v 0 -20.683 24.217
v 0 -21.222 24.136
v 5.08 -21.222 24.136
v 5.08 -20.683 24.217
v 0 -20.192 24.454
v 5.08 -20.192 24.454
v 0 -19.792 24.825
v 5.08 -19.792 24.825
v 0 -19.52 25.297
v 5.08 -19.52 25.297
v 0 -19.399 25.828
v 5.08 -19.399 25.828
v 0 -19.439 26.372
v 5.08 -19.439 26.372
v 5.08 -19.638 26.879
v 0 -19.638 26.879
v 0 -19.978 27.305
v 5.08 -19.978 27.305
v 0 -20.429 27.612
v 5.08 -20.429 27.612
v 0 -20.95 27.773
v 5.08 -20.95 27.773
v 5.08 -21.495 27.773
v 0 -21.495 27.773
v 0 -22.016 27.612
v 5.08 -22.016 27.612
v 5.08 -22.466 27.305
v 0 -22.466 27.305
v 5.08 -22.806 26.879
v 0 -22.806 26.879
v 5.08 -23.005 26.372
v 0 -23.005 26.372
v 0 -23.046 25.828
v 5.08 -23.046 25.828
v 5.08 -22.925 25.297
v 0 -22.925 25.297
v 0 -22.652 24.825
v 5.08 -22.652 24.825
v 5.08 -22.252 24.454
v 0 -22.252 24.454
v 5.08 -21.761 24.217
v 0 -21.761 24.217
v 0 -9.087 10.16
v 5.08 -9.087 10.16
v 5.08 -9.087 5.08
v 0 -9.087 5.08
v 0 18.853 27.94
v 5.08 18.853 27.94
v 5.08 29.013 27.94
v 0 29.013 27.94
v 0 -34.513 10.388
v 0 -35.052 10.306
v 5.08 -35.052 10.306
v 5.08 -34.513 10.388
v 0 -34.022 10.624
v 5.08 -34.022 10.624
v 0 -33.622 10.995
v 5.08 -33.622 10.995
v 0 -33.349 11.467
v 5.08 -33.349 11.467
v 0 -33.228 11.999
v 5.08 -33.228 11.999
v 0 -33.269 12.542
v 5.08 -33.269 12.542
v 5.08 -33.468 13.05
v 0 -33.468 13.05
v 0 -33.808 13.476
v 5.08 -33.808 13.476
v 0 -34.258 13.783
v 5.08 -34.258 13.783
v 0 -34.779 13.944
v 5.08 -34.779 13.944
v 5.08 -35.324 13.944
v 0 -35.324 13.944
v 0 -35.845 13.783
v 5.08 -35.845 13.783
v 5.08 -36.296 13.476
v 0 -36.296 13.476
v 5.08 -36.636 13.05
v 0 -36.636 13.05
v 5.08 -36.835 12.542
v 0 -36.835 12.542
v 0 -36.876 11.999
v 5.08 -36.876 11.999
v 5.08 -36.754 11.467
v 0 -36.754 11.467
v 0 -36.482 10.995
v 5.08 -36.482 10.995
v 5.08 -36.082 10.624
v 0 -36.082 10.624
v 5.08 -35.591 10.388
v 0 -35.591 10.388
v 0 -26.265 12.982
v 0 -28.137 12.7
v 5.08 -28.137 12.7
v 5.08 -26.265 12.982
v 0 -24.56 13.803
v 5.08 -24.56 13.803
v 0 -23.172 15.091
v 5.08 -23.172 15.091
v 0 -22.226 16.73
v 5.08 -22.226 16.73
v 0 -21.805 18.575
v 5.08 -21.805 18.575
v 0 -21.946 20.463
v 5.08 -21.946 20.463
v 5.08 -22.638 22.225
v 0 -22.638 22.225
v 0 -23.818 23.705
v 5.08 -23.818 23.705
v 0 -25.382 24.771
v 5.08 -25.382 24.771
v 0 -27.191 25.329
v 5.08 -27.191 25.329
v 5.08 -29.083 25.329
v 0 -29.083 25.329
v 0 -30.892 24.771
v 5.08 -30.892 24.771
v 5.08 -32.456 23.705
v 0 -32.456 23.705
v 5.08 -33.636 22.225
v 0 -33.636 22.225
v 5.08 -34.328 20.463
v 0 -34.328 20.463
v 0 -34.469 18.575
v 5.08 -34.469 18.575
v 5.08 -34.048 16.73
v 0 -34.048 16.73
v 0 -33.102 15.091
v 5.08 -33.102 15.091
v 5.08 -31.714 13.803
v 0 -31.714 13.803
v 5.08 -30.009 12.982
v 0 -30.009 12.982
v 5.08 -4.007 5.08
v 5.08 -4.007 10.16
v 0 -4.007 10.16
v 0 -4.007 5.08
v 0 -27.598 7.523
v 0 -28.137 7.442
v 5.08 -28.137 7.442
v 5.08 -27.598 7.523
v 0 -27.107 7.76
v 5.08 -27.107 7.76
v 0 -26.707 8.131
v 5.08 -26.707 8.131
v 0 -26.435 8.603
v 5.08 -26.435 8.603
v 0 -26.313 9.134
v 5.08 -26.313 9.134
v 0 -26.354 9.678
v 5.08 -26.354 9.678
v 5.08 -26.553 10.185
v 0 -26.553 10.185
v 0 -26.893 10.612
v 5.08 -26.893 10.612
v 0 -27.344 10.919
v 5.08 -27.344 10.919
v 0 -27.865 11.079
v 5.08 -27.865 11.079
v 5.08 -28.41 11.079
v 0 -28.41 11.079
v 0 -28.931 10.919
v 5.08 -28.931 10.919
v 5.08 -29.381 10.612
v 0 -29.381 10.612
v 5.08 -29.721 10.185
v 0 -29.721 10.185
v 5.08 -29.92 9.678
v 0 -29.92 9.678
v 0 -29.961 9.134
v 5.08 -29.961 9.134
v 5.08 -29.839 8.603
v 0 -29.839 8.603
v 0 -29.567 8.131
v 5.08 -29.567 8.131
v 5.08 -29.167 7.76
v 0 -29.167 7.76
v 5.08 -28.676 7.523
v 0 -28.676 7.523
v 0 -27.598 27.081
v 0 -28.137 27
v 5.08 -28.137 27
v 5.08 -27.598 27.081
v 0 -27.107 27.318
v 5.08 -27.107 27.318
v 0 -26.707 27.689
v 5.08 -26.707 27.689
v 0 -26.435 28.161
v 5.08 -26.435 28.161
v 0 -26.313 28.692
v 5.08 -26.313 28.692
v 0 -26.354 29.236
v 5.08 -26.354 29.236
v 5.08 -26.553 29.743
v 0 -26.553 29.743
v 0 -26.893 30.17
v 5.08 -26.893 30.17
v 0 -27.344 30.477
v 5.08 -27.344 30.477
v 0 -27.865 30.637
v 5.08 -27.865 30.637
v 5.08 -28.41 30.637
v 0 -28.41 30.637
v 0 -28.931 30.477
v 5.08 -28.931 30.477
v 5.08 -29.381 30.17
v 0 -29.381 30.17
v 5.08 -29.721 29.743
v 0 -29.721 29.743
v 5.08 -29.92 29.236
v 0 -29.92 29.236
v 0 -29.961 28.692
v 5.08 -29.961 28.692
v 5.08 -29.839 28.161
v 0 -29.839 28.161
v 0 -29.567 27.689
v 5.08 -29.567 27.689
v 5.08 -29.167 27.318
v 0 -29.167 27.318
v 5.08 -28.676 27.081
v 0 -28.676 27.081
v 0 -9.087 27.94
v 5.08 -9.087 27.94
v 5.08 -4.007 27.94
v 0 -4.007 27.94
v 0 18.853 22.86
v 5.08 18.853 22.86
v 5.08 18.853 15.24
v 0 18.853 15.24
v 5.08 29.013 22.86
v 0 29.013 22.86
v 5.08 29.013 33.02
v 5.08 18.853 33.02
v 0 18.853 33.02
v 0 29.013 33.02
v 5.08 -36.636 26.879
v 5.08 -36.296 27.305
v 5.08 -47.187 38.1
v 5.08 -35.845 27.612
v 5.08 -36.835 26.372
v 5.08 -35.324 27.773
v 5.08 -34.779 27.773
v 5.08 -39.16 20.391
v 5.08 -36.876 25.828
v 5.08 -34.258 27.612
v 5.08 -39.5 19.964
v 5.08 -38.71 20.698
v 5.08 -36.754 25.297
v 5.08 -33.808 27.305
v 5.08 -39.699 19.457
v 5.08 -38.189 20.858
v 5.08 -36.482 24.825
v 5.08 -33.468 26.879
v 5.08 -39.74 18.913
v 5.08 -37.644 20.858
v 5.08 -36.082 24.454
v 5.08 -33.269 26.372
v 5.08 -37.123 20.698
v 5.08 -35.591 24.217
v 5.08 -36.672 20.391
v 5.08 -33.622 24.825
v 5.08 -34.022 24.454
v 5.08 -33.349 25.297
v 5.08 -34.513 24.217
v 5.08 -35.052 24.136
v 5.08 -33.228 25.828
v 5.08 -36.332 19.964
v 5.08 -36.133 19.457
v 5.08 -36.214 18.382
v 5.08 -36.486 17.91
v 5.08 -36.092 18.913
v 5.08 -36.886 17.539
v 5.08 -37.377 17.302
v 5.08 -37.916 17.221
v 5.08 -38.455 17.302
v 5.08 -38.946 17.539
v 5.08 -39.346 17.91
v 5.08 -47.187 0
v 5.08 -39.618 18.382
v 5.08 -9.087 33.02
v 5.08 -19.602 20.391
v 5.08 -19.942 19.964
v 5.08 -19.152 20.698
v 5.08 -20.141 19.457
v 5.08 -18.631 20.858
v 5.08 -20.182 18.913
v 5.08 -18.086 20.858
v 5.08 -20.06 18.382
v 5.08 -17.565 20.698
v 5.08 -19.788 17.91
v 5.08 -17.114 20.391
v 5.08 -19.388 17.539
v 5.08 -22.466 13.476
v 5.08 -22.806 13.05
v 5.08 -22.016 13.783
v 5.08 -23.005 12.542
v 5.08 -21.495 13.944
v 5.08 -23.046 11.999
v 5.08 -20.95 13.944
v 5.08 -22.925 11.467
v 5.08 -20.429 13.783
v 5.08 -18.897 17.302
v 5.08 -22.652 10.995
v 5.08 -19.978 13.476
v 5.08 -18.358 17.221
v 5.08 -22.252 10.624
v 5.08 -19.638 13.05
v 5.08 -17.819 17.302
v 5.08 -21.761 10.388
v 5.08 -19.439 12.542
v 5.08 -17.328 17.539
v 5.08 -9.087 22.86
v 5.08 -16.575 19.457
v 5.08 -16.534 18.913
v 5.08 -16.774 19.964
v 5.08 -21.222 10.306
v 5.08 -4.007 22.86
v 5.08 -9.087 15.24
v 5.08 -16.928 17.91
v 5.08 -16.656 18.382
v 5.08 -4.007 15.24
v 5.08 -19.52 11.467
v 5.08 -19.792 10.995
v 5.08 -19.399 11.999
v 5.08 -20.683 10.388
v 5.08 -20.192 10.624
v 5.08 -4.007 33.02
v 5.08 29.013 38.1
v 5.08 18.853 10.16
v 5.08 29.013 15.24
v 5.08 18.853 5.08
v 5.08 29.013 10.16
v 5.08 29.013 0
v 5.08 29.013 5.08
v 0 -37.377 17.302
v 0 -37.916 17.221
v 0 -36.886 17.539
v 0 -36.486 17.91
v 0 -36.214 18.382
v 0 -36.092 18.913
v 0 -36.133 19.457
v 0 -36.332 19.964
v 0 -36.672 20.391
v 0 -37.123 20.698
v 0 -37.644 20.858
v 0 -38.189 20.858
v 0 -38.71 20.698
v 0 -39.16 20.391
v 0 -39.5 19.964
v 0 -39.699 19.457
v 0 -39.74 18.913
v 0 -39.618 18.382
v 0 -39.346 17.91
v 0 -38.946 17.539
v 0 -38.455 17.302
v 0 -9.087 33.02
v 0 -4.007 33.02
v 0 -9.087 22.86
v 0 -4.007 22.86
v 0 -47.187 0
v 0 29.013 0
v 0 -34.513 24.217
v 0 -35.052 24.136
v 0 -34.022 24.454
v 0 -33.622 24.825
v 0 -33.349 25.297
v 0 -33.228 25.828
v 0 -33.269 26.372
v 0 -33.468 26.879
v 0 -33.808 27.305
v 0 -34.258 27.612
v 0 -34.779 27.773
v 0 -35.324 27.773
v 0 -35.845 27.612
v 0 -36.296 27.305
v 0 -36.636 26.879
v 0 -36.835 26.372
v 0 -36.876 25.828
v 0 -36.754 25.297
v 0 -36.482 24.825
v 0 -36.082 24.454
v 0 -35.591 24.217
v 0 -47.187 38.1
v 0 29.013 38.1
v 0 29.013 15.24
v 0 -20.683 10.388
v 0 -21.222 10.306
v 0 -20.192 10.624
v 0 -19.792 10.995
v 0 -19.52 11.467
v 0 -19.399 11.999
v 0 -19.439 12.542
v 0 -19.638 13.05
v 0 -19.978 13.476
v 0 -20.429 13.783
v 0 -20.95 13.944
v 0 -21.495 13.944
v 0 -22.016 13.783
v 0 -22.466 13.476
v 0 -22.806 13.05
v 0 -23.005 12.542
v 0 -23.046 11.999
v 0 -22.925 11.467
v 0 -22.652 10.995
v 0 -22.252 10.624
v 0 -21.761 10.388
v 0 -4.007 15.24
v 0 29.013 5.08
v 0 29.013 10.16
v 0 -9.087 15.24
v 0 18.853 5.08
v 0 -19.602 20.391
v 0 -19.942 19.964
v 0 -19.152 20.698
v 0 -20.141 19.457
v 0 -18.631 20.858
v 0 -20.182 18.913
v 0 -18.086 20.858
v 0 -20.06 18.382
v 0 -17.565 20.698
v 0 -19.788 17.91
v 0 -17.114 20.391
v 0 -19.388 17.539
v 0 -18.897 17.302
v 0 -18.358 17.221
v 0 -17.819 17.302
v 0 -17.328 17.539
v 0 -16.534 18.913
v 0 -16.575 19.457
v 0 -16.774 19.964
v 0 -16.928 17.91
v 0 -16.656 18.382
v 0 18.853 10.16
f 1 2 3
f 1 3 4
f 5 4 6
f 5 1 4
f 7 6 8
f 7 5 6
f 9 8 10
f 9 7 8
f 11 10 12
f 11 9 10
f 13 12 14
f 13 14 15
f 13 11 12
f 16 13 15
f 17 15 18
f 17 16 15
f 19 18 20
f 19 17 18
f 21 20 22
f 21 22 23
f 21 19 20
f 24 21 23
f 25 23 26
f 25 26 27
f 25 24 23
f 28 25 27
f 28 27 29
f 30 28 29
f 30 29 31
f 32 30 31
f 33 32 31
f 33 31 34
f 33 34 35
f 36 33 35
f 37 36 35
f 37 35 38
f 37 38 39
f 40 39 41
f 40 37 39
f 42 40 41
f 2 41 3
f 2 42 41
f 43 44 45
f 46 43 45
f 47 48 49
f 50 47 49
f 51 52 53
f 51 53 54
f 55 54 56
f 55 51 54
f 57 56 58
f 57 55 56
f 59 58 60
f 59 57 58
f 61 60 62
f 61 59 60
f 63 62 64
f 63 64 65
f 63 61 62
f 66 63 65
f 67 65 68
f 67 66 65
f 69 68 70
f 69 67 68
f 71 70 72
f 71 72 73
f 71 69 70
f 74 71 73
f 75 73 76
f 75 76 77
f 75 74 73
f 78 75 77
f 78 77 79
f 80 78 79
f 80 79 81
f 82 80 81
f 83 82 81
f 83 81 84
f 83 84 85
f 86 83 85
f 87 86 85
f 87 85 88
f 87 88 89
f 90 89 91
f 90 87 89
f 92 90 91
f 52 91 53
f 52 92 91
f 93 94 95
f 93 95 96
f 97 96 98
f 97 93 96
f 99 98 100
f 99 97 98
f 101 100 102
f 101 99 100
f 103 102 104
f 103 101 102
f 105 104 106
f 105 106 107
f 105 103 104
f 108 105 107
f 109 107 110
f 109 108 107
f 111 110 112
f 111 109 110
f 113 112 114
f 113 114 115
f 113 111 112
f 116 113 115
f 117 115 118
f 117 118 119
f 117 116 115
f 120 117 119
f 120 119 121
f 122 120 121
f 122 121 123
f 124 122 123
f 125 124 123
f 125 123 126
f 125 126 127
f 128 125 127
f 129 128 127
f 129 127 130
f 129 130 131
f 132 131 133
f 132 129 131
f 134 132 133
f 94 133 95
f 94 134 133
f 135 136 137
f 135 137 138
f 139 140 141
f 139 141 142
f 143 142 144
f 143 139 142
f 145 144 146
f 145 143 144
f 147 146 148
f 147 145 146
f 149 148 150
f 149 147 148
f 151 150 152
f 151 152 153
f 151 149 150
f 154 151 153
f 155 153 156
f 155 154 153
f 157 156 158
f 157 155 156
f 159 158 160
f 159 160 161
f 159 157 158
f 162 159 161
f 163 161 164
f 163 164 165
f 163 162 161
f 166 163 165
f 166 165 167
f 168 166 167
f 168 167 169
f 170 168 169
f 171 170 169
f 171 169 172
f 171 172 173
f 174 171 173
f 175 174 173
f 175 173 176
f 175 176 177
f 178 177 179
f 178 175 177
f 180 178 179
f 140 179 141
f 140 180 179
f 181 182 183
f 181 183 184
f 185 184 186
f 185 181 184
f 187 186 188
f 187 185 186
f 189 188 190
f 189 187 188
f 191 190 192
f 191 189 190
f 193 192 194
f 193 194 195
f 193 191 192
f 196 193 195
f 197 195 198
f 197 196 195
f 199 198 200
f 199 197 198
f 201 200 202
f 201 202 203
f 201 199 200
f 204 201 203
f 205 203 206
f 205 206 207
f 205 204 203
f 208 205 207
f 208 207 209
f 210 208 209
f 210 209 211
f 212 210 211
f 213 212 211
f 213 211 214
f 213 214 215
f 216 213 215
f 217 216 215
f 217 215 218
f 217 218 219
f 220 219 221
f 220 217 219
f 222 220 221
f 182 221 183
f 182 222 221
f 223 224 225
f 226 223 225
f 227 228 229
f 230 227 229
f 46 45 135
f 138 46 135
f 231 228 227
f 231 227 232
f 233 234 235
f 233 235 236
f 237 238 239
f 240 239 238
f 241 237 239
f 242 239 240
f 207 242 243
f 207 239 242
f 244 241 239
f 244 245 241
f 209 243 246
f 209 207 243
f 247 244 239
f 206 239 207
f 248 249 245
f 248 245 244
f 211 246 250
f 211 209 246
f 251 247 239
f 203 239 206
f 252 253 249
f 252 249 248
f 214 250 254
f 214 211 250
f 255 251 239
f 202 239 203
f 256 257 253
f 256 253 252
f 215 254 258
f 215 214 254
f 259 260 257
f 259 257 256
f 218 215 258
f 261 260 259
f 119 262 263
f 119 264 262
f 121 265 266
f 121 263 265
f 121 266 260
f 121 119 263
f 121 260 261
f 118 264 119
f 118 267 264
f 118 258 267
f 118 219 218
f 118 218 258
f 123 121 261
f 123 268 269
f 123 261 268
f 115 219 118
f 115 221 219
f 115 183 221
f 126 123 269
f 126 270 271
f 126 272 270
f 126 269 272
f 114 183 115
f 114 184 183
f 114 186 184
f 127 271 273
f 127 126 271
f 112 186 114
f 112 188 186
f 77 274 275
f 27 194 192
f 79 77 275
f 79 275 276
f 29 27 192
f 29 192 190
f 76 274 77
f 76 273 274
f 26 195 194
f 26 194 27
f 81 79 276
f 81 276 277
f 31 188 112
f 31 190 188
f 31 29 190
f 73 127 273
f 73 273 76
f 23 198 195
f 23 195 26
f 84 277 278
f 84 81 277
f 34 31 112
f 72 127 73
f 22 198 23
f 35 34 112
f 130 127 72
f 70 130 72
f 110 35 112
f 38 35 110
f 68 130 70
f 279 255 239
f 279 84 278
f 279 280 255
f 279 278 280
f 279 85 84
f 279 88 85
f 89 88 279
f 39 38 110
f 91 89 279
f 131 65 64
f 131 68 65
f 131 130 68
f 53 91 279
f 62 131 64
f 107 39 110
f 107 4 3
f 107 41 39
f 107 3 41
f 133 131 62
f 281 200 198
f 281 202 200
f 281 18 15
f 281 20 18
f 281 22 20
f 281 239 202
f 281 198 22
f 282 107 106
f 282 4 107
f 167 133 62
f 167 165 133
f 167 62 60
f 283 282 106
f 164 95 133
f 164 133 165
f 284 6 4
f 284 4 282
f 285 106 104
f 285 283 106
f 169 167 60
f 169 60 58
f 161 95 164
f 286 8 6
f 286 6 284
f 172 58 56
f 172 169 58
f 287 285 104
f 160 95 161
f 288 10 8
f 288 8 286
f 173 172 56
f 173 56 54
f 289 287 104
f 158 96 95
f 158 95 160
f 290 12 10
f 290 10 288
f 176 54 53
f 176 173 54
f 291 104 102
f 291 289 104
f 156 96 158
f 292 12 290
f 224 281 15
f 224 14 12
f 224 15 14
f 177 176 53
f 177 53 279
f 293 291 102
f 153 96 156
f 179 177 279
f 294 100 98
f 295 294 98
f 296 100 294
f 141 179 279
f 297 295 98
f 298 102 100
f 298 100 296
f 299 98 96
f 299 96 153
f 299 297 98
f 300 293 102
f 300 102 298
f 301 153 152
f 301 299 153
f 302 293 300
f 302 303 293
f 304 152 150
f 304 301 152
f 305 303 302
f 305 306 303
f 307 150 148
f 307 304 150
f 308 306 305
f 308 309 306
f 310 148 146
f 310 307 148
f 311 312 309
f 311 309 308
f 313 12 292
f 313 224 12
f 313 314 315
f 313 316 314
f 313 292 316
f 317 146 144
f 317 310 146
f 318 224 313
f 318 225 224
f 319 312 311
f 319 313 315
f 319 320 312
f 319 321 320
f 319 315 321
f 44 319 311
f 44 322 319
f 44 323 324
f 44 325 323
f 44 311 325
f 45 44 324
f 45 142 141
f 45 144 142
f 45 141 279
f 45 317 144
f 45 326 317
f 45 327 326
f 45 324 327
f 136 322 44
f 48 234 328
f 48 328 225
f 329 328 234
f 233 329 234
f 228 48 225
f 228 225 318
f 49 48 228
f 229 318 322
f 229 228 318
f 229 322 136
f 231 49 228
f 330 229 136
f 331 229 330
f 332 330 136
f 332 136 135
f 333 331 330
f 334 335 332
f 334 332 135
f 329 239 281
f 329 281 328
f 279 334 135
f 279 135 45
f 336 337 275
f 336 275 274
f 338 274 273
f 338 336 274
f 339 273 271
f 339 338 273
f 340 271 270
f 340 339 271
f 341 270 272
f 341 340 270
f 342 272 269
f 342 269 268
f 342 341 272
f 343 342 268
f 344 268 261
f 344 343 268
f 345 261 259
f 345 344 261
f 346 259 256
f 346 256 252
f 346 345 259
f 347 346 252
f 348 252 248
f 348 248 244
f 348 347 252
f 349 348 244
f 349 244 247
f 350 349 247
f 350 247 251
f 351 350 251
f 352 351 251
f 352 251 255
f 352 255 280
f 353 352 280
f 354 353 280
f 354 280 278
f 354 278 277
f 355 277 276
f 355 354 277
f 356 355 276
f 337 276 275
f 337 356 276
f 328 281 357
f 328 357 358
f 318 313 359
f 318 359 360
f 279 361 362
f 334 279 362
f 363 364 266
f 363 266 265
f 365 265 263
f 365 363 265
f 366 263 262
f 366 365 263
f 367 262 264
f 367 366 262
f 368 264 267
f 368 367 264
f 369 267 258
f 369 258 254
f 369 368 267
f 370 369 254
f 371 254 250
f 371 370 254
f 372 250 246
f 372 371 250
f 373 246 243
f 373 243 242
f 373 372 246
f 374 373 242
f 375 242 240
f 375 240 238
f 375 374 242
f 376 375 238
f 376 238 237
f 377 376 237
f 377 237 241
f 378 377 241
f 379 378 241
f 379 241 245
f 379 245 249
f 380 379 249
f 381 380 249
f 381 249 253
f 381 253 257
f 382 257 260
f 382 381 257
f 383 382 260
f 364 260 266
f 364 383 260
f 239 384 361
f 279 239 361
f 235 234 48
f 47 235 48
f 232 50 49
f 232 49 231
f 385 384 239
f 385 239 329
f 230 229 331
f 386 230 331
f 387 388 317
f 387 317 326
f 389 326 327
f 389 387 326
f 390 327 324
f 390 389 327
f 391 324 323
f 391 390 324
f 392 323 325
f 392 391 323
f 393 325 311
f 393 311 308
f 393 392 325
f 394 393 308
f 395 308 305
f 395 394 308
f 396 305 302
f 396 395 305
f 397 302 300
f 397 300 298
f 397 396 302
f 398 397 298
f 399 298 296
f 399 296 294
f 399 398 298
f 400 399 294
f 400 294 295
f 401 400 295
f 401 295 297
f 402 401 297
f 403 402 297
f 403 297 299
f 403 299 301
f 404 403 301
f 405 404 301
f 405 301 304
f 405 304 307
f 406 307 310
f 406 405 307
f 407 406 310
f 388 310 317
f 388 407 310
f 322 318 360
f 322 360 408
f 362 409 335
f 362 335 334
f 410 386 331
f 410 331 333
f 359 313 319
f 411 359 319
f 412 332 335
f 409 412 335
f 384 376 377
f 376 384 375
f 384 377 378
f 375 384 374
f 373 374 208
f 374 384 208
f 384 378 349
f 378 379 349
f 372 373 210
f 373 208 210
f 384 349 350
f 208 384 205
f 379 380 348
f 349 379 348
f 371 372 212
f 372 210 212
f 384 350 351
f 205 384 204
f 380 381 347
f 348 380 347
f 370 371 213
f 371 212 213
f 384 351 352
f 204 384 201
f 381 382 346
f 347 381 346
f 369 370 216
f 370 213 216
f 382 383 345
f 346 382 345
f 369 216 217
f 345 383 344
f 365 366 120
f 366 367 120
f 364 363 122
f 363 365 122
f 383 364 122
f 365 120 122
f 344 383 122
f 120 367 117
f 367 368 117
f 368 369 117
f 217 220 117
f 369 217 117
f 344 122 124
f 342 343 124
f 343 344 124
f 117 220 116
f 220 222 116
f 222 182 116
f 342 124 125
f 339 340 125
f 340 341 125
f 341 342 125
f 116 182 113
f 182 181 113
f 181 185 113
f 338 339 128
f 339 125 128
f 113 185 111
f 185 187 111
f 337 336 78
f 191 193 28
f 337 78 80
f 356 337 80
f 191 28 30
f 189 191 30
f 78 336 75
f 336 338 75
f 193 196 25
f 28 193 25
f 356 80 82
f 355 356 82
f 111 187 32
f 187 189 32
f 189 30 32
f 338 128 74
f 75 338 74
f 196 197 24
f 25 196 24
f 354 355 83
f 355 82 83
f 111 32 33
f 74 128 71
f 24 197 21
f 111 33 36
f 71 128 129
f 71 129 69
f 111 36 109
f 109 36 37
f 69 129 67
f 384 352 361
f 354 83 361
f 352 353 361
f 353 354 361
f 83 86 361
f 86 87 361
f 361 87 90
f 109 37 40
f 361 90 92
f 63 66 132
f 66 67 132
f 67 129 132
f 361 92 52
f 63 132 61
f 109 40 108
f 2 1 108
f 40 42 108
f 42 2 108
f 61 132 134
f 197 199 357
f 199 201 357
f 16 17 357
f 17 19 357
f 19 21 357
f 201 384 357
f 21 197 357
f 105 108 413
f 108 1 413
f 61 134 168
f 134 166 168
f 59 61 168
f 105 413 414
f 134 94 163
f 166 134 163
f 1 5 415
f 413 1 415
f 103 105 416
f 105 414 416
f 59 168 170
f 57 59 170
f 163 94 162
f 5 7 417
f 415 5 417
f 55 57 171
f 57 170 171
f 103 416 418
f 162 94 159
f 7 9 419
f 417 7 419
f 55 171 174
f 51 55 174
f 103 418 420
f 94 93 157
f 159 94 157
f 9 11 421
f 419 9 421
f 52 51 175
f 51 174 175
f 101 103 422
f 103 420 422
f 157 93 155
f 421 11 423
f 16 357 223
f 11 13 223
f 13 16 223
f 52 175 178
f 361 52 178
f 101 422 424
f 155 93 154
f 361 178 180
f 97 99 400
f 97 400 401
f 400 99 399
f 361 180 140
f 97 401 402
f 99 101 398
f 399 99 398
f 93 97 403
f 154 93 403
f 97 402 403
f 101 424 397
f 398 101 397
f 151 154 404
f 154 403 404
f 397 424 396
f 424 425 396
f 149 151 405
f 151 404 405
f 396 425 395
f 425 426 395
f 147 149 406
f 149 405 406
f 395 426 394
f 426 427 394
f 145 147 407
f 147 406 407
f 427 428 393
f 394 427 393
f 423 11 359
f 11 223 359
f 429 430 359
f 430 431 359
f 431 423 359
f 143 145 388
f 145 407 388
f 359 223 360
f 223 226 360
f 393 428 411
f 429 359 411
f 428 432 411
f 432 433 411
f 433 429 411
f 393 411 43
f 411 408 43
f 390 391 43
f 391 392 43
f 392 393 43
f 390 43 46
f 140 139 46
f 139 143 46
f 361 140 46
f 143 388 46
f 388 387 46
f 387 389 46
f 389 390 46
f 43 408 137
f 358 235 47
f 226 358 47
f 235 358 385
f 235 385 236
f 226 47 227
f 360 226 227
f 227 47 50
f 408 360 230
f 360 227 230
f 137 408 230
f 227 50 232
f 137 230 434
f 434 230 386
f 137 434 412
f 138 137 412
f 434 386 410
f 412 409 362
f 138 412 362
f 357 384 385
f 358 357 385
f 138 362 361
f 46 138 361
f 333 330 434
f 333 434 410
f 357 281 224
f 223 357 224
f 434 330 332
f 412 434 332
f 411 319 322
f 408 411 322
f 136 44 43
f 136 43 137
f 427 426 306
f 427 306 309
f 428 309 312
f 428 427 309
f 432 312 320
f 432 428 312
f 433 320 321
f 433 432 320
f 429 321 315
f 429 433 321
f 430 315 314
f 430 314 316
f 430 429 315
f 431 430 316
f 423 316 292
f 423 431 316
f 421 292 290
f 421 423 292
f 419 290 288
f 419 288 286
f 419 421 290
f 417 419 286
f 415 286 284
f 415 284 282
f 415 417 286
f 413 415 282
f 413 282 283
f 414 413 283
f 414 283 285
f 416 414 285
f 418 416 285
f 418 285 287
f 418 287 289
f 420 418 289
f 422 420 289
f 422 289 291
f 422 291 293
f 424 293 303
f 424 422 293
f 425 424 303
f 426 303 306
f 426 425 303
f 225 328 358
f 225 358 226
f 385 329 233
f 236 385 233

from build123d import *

# Parameters (mm, degrees)
SKETCH1_W           = 38.1
SKETCH1_H           = 76.2
SKETCH1_R           = 1.8288
SKETCH1_R_2         = 6.35
BOSS_EXTRUDE1_DEPTH = 5.08
SKETCH2_W           = 5.08
SKETCH2_H           = 10.16
SKETCH2_W_2         = 7.62
SKETCH2_H_2         = 5.08
CUT_EXTRUDE1_DEPTH  = 5.08


with BuildPart() as part:
    # Sketch1 → Boss-Extrude1 (new body)
    with BuildSketch(Plane(origin=(0, 0, 0), x_dir=(0, 0, -1), z_dir=(1, 0, 0))):
        with Locations((-19.05, -9.087068966)):
            Rectangle(SKETCH1_W, SKETCH1_H)
        with Locations((-19.05, -18.358068966)):
            Circle(SKETCH1_R, mode=Mode.SUBTRACT)
        with Locations((-19.05, -28.137068966)):
            Circle(SKETCH1_R_2, mode=Mode.SUBTRACT)
        with Locations((-12.135202787, -21.222271752)):
            Circle(SKETCH1_R, mode=Mode.SUBTRACT)
        with Locations((-9.271, -28.137068966)):
            Circle(SKETCH1_R, mode=Mode.SUBTRACT)
        with Locations((-12.135202787, -35.051866179)):
            Circle(SKETCH1_R, mode=Mode.SUBTRACT)
        with Locations((-19.05, -37.916068966)):
            Circle(SKETCH1_R, mode=Mode.SUBTRACT)
        with Locations((-25.964797213, -35.051866179)):
            Circle(SKETCH1_R, mode=Mode.SUBTRACT)
        with Locations((-28.829, -28.137068966)):
            Circle(SKETCH1_R, mode=Mode.SUBTRACT)
        with Locations((-25.964797213, -21.222271752)):
            Circle(SKETCH1_R, mode=Mode.SUBTRACT)
    extrude(amount=BOSS_EXTRUDE1_DEPTH)

    # Sketch2 → Cut-Extrude1 (cut)
    with BuildSketch(Plane(origin=(5.08, 0, 0), x_dir=(0, 0, -1), z_dir=(1, 0, 0))):
        with Locations((-30.48, 23.932931034)):
            Rectangle(SKETCH2_W, SKETCH2_H)
        with Locations((-7.62, 23.932931034)):
            Rectangle(SKETCH2_W, SKETCH2_H)
        with Locations((-19.05, 23.932931034)):
            Rectangle(SKETCH2_W_2, SKETCH2_H)
        with Locations((-30.48, -6.547068966)):
            Rectangle(SKETCH2_W, SKETCH2_H_2)
        with Locations((-19.05, -6.547068966)):
            Rectangle(SKETCH2_W_2, SKETCH2_H_2)
        with Locations((-7.62, -6.547068966)):
            Rectangle(SKETCH2_W, SKETCH2_H_2)
    extrude(amount=-CUT_EXTRUDE1_DEPTH, mode=Mode.SUBTRACT)


solid = part.part
